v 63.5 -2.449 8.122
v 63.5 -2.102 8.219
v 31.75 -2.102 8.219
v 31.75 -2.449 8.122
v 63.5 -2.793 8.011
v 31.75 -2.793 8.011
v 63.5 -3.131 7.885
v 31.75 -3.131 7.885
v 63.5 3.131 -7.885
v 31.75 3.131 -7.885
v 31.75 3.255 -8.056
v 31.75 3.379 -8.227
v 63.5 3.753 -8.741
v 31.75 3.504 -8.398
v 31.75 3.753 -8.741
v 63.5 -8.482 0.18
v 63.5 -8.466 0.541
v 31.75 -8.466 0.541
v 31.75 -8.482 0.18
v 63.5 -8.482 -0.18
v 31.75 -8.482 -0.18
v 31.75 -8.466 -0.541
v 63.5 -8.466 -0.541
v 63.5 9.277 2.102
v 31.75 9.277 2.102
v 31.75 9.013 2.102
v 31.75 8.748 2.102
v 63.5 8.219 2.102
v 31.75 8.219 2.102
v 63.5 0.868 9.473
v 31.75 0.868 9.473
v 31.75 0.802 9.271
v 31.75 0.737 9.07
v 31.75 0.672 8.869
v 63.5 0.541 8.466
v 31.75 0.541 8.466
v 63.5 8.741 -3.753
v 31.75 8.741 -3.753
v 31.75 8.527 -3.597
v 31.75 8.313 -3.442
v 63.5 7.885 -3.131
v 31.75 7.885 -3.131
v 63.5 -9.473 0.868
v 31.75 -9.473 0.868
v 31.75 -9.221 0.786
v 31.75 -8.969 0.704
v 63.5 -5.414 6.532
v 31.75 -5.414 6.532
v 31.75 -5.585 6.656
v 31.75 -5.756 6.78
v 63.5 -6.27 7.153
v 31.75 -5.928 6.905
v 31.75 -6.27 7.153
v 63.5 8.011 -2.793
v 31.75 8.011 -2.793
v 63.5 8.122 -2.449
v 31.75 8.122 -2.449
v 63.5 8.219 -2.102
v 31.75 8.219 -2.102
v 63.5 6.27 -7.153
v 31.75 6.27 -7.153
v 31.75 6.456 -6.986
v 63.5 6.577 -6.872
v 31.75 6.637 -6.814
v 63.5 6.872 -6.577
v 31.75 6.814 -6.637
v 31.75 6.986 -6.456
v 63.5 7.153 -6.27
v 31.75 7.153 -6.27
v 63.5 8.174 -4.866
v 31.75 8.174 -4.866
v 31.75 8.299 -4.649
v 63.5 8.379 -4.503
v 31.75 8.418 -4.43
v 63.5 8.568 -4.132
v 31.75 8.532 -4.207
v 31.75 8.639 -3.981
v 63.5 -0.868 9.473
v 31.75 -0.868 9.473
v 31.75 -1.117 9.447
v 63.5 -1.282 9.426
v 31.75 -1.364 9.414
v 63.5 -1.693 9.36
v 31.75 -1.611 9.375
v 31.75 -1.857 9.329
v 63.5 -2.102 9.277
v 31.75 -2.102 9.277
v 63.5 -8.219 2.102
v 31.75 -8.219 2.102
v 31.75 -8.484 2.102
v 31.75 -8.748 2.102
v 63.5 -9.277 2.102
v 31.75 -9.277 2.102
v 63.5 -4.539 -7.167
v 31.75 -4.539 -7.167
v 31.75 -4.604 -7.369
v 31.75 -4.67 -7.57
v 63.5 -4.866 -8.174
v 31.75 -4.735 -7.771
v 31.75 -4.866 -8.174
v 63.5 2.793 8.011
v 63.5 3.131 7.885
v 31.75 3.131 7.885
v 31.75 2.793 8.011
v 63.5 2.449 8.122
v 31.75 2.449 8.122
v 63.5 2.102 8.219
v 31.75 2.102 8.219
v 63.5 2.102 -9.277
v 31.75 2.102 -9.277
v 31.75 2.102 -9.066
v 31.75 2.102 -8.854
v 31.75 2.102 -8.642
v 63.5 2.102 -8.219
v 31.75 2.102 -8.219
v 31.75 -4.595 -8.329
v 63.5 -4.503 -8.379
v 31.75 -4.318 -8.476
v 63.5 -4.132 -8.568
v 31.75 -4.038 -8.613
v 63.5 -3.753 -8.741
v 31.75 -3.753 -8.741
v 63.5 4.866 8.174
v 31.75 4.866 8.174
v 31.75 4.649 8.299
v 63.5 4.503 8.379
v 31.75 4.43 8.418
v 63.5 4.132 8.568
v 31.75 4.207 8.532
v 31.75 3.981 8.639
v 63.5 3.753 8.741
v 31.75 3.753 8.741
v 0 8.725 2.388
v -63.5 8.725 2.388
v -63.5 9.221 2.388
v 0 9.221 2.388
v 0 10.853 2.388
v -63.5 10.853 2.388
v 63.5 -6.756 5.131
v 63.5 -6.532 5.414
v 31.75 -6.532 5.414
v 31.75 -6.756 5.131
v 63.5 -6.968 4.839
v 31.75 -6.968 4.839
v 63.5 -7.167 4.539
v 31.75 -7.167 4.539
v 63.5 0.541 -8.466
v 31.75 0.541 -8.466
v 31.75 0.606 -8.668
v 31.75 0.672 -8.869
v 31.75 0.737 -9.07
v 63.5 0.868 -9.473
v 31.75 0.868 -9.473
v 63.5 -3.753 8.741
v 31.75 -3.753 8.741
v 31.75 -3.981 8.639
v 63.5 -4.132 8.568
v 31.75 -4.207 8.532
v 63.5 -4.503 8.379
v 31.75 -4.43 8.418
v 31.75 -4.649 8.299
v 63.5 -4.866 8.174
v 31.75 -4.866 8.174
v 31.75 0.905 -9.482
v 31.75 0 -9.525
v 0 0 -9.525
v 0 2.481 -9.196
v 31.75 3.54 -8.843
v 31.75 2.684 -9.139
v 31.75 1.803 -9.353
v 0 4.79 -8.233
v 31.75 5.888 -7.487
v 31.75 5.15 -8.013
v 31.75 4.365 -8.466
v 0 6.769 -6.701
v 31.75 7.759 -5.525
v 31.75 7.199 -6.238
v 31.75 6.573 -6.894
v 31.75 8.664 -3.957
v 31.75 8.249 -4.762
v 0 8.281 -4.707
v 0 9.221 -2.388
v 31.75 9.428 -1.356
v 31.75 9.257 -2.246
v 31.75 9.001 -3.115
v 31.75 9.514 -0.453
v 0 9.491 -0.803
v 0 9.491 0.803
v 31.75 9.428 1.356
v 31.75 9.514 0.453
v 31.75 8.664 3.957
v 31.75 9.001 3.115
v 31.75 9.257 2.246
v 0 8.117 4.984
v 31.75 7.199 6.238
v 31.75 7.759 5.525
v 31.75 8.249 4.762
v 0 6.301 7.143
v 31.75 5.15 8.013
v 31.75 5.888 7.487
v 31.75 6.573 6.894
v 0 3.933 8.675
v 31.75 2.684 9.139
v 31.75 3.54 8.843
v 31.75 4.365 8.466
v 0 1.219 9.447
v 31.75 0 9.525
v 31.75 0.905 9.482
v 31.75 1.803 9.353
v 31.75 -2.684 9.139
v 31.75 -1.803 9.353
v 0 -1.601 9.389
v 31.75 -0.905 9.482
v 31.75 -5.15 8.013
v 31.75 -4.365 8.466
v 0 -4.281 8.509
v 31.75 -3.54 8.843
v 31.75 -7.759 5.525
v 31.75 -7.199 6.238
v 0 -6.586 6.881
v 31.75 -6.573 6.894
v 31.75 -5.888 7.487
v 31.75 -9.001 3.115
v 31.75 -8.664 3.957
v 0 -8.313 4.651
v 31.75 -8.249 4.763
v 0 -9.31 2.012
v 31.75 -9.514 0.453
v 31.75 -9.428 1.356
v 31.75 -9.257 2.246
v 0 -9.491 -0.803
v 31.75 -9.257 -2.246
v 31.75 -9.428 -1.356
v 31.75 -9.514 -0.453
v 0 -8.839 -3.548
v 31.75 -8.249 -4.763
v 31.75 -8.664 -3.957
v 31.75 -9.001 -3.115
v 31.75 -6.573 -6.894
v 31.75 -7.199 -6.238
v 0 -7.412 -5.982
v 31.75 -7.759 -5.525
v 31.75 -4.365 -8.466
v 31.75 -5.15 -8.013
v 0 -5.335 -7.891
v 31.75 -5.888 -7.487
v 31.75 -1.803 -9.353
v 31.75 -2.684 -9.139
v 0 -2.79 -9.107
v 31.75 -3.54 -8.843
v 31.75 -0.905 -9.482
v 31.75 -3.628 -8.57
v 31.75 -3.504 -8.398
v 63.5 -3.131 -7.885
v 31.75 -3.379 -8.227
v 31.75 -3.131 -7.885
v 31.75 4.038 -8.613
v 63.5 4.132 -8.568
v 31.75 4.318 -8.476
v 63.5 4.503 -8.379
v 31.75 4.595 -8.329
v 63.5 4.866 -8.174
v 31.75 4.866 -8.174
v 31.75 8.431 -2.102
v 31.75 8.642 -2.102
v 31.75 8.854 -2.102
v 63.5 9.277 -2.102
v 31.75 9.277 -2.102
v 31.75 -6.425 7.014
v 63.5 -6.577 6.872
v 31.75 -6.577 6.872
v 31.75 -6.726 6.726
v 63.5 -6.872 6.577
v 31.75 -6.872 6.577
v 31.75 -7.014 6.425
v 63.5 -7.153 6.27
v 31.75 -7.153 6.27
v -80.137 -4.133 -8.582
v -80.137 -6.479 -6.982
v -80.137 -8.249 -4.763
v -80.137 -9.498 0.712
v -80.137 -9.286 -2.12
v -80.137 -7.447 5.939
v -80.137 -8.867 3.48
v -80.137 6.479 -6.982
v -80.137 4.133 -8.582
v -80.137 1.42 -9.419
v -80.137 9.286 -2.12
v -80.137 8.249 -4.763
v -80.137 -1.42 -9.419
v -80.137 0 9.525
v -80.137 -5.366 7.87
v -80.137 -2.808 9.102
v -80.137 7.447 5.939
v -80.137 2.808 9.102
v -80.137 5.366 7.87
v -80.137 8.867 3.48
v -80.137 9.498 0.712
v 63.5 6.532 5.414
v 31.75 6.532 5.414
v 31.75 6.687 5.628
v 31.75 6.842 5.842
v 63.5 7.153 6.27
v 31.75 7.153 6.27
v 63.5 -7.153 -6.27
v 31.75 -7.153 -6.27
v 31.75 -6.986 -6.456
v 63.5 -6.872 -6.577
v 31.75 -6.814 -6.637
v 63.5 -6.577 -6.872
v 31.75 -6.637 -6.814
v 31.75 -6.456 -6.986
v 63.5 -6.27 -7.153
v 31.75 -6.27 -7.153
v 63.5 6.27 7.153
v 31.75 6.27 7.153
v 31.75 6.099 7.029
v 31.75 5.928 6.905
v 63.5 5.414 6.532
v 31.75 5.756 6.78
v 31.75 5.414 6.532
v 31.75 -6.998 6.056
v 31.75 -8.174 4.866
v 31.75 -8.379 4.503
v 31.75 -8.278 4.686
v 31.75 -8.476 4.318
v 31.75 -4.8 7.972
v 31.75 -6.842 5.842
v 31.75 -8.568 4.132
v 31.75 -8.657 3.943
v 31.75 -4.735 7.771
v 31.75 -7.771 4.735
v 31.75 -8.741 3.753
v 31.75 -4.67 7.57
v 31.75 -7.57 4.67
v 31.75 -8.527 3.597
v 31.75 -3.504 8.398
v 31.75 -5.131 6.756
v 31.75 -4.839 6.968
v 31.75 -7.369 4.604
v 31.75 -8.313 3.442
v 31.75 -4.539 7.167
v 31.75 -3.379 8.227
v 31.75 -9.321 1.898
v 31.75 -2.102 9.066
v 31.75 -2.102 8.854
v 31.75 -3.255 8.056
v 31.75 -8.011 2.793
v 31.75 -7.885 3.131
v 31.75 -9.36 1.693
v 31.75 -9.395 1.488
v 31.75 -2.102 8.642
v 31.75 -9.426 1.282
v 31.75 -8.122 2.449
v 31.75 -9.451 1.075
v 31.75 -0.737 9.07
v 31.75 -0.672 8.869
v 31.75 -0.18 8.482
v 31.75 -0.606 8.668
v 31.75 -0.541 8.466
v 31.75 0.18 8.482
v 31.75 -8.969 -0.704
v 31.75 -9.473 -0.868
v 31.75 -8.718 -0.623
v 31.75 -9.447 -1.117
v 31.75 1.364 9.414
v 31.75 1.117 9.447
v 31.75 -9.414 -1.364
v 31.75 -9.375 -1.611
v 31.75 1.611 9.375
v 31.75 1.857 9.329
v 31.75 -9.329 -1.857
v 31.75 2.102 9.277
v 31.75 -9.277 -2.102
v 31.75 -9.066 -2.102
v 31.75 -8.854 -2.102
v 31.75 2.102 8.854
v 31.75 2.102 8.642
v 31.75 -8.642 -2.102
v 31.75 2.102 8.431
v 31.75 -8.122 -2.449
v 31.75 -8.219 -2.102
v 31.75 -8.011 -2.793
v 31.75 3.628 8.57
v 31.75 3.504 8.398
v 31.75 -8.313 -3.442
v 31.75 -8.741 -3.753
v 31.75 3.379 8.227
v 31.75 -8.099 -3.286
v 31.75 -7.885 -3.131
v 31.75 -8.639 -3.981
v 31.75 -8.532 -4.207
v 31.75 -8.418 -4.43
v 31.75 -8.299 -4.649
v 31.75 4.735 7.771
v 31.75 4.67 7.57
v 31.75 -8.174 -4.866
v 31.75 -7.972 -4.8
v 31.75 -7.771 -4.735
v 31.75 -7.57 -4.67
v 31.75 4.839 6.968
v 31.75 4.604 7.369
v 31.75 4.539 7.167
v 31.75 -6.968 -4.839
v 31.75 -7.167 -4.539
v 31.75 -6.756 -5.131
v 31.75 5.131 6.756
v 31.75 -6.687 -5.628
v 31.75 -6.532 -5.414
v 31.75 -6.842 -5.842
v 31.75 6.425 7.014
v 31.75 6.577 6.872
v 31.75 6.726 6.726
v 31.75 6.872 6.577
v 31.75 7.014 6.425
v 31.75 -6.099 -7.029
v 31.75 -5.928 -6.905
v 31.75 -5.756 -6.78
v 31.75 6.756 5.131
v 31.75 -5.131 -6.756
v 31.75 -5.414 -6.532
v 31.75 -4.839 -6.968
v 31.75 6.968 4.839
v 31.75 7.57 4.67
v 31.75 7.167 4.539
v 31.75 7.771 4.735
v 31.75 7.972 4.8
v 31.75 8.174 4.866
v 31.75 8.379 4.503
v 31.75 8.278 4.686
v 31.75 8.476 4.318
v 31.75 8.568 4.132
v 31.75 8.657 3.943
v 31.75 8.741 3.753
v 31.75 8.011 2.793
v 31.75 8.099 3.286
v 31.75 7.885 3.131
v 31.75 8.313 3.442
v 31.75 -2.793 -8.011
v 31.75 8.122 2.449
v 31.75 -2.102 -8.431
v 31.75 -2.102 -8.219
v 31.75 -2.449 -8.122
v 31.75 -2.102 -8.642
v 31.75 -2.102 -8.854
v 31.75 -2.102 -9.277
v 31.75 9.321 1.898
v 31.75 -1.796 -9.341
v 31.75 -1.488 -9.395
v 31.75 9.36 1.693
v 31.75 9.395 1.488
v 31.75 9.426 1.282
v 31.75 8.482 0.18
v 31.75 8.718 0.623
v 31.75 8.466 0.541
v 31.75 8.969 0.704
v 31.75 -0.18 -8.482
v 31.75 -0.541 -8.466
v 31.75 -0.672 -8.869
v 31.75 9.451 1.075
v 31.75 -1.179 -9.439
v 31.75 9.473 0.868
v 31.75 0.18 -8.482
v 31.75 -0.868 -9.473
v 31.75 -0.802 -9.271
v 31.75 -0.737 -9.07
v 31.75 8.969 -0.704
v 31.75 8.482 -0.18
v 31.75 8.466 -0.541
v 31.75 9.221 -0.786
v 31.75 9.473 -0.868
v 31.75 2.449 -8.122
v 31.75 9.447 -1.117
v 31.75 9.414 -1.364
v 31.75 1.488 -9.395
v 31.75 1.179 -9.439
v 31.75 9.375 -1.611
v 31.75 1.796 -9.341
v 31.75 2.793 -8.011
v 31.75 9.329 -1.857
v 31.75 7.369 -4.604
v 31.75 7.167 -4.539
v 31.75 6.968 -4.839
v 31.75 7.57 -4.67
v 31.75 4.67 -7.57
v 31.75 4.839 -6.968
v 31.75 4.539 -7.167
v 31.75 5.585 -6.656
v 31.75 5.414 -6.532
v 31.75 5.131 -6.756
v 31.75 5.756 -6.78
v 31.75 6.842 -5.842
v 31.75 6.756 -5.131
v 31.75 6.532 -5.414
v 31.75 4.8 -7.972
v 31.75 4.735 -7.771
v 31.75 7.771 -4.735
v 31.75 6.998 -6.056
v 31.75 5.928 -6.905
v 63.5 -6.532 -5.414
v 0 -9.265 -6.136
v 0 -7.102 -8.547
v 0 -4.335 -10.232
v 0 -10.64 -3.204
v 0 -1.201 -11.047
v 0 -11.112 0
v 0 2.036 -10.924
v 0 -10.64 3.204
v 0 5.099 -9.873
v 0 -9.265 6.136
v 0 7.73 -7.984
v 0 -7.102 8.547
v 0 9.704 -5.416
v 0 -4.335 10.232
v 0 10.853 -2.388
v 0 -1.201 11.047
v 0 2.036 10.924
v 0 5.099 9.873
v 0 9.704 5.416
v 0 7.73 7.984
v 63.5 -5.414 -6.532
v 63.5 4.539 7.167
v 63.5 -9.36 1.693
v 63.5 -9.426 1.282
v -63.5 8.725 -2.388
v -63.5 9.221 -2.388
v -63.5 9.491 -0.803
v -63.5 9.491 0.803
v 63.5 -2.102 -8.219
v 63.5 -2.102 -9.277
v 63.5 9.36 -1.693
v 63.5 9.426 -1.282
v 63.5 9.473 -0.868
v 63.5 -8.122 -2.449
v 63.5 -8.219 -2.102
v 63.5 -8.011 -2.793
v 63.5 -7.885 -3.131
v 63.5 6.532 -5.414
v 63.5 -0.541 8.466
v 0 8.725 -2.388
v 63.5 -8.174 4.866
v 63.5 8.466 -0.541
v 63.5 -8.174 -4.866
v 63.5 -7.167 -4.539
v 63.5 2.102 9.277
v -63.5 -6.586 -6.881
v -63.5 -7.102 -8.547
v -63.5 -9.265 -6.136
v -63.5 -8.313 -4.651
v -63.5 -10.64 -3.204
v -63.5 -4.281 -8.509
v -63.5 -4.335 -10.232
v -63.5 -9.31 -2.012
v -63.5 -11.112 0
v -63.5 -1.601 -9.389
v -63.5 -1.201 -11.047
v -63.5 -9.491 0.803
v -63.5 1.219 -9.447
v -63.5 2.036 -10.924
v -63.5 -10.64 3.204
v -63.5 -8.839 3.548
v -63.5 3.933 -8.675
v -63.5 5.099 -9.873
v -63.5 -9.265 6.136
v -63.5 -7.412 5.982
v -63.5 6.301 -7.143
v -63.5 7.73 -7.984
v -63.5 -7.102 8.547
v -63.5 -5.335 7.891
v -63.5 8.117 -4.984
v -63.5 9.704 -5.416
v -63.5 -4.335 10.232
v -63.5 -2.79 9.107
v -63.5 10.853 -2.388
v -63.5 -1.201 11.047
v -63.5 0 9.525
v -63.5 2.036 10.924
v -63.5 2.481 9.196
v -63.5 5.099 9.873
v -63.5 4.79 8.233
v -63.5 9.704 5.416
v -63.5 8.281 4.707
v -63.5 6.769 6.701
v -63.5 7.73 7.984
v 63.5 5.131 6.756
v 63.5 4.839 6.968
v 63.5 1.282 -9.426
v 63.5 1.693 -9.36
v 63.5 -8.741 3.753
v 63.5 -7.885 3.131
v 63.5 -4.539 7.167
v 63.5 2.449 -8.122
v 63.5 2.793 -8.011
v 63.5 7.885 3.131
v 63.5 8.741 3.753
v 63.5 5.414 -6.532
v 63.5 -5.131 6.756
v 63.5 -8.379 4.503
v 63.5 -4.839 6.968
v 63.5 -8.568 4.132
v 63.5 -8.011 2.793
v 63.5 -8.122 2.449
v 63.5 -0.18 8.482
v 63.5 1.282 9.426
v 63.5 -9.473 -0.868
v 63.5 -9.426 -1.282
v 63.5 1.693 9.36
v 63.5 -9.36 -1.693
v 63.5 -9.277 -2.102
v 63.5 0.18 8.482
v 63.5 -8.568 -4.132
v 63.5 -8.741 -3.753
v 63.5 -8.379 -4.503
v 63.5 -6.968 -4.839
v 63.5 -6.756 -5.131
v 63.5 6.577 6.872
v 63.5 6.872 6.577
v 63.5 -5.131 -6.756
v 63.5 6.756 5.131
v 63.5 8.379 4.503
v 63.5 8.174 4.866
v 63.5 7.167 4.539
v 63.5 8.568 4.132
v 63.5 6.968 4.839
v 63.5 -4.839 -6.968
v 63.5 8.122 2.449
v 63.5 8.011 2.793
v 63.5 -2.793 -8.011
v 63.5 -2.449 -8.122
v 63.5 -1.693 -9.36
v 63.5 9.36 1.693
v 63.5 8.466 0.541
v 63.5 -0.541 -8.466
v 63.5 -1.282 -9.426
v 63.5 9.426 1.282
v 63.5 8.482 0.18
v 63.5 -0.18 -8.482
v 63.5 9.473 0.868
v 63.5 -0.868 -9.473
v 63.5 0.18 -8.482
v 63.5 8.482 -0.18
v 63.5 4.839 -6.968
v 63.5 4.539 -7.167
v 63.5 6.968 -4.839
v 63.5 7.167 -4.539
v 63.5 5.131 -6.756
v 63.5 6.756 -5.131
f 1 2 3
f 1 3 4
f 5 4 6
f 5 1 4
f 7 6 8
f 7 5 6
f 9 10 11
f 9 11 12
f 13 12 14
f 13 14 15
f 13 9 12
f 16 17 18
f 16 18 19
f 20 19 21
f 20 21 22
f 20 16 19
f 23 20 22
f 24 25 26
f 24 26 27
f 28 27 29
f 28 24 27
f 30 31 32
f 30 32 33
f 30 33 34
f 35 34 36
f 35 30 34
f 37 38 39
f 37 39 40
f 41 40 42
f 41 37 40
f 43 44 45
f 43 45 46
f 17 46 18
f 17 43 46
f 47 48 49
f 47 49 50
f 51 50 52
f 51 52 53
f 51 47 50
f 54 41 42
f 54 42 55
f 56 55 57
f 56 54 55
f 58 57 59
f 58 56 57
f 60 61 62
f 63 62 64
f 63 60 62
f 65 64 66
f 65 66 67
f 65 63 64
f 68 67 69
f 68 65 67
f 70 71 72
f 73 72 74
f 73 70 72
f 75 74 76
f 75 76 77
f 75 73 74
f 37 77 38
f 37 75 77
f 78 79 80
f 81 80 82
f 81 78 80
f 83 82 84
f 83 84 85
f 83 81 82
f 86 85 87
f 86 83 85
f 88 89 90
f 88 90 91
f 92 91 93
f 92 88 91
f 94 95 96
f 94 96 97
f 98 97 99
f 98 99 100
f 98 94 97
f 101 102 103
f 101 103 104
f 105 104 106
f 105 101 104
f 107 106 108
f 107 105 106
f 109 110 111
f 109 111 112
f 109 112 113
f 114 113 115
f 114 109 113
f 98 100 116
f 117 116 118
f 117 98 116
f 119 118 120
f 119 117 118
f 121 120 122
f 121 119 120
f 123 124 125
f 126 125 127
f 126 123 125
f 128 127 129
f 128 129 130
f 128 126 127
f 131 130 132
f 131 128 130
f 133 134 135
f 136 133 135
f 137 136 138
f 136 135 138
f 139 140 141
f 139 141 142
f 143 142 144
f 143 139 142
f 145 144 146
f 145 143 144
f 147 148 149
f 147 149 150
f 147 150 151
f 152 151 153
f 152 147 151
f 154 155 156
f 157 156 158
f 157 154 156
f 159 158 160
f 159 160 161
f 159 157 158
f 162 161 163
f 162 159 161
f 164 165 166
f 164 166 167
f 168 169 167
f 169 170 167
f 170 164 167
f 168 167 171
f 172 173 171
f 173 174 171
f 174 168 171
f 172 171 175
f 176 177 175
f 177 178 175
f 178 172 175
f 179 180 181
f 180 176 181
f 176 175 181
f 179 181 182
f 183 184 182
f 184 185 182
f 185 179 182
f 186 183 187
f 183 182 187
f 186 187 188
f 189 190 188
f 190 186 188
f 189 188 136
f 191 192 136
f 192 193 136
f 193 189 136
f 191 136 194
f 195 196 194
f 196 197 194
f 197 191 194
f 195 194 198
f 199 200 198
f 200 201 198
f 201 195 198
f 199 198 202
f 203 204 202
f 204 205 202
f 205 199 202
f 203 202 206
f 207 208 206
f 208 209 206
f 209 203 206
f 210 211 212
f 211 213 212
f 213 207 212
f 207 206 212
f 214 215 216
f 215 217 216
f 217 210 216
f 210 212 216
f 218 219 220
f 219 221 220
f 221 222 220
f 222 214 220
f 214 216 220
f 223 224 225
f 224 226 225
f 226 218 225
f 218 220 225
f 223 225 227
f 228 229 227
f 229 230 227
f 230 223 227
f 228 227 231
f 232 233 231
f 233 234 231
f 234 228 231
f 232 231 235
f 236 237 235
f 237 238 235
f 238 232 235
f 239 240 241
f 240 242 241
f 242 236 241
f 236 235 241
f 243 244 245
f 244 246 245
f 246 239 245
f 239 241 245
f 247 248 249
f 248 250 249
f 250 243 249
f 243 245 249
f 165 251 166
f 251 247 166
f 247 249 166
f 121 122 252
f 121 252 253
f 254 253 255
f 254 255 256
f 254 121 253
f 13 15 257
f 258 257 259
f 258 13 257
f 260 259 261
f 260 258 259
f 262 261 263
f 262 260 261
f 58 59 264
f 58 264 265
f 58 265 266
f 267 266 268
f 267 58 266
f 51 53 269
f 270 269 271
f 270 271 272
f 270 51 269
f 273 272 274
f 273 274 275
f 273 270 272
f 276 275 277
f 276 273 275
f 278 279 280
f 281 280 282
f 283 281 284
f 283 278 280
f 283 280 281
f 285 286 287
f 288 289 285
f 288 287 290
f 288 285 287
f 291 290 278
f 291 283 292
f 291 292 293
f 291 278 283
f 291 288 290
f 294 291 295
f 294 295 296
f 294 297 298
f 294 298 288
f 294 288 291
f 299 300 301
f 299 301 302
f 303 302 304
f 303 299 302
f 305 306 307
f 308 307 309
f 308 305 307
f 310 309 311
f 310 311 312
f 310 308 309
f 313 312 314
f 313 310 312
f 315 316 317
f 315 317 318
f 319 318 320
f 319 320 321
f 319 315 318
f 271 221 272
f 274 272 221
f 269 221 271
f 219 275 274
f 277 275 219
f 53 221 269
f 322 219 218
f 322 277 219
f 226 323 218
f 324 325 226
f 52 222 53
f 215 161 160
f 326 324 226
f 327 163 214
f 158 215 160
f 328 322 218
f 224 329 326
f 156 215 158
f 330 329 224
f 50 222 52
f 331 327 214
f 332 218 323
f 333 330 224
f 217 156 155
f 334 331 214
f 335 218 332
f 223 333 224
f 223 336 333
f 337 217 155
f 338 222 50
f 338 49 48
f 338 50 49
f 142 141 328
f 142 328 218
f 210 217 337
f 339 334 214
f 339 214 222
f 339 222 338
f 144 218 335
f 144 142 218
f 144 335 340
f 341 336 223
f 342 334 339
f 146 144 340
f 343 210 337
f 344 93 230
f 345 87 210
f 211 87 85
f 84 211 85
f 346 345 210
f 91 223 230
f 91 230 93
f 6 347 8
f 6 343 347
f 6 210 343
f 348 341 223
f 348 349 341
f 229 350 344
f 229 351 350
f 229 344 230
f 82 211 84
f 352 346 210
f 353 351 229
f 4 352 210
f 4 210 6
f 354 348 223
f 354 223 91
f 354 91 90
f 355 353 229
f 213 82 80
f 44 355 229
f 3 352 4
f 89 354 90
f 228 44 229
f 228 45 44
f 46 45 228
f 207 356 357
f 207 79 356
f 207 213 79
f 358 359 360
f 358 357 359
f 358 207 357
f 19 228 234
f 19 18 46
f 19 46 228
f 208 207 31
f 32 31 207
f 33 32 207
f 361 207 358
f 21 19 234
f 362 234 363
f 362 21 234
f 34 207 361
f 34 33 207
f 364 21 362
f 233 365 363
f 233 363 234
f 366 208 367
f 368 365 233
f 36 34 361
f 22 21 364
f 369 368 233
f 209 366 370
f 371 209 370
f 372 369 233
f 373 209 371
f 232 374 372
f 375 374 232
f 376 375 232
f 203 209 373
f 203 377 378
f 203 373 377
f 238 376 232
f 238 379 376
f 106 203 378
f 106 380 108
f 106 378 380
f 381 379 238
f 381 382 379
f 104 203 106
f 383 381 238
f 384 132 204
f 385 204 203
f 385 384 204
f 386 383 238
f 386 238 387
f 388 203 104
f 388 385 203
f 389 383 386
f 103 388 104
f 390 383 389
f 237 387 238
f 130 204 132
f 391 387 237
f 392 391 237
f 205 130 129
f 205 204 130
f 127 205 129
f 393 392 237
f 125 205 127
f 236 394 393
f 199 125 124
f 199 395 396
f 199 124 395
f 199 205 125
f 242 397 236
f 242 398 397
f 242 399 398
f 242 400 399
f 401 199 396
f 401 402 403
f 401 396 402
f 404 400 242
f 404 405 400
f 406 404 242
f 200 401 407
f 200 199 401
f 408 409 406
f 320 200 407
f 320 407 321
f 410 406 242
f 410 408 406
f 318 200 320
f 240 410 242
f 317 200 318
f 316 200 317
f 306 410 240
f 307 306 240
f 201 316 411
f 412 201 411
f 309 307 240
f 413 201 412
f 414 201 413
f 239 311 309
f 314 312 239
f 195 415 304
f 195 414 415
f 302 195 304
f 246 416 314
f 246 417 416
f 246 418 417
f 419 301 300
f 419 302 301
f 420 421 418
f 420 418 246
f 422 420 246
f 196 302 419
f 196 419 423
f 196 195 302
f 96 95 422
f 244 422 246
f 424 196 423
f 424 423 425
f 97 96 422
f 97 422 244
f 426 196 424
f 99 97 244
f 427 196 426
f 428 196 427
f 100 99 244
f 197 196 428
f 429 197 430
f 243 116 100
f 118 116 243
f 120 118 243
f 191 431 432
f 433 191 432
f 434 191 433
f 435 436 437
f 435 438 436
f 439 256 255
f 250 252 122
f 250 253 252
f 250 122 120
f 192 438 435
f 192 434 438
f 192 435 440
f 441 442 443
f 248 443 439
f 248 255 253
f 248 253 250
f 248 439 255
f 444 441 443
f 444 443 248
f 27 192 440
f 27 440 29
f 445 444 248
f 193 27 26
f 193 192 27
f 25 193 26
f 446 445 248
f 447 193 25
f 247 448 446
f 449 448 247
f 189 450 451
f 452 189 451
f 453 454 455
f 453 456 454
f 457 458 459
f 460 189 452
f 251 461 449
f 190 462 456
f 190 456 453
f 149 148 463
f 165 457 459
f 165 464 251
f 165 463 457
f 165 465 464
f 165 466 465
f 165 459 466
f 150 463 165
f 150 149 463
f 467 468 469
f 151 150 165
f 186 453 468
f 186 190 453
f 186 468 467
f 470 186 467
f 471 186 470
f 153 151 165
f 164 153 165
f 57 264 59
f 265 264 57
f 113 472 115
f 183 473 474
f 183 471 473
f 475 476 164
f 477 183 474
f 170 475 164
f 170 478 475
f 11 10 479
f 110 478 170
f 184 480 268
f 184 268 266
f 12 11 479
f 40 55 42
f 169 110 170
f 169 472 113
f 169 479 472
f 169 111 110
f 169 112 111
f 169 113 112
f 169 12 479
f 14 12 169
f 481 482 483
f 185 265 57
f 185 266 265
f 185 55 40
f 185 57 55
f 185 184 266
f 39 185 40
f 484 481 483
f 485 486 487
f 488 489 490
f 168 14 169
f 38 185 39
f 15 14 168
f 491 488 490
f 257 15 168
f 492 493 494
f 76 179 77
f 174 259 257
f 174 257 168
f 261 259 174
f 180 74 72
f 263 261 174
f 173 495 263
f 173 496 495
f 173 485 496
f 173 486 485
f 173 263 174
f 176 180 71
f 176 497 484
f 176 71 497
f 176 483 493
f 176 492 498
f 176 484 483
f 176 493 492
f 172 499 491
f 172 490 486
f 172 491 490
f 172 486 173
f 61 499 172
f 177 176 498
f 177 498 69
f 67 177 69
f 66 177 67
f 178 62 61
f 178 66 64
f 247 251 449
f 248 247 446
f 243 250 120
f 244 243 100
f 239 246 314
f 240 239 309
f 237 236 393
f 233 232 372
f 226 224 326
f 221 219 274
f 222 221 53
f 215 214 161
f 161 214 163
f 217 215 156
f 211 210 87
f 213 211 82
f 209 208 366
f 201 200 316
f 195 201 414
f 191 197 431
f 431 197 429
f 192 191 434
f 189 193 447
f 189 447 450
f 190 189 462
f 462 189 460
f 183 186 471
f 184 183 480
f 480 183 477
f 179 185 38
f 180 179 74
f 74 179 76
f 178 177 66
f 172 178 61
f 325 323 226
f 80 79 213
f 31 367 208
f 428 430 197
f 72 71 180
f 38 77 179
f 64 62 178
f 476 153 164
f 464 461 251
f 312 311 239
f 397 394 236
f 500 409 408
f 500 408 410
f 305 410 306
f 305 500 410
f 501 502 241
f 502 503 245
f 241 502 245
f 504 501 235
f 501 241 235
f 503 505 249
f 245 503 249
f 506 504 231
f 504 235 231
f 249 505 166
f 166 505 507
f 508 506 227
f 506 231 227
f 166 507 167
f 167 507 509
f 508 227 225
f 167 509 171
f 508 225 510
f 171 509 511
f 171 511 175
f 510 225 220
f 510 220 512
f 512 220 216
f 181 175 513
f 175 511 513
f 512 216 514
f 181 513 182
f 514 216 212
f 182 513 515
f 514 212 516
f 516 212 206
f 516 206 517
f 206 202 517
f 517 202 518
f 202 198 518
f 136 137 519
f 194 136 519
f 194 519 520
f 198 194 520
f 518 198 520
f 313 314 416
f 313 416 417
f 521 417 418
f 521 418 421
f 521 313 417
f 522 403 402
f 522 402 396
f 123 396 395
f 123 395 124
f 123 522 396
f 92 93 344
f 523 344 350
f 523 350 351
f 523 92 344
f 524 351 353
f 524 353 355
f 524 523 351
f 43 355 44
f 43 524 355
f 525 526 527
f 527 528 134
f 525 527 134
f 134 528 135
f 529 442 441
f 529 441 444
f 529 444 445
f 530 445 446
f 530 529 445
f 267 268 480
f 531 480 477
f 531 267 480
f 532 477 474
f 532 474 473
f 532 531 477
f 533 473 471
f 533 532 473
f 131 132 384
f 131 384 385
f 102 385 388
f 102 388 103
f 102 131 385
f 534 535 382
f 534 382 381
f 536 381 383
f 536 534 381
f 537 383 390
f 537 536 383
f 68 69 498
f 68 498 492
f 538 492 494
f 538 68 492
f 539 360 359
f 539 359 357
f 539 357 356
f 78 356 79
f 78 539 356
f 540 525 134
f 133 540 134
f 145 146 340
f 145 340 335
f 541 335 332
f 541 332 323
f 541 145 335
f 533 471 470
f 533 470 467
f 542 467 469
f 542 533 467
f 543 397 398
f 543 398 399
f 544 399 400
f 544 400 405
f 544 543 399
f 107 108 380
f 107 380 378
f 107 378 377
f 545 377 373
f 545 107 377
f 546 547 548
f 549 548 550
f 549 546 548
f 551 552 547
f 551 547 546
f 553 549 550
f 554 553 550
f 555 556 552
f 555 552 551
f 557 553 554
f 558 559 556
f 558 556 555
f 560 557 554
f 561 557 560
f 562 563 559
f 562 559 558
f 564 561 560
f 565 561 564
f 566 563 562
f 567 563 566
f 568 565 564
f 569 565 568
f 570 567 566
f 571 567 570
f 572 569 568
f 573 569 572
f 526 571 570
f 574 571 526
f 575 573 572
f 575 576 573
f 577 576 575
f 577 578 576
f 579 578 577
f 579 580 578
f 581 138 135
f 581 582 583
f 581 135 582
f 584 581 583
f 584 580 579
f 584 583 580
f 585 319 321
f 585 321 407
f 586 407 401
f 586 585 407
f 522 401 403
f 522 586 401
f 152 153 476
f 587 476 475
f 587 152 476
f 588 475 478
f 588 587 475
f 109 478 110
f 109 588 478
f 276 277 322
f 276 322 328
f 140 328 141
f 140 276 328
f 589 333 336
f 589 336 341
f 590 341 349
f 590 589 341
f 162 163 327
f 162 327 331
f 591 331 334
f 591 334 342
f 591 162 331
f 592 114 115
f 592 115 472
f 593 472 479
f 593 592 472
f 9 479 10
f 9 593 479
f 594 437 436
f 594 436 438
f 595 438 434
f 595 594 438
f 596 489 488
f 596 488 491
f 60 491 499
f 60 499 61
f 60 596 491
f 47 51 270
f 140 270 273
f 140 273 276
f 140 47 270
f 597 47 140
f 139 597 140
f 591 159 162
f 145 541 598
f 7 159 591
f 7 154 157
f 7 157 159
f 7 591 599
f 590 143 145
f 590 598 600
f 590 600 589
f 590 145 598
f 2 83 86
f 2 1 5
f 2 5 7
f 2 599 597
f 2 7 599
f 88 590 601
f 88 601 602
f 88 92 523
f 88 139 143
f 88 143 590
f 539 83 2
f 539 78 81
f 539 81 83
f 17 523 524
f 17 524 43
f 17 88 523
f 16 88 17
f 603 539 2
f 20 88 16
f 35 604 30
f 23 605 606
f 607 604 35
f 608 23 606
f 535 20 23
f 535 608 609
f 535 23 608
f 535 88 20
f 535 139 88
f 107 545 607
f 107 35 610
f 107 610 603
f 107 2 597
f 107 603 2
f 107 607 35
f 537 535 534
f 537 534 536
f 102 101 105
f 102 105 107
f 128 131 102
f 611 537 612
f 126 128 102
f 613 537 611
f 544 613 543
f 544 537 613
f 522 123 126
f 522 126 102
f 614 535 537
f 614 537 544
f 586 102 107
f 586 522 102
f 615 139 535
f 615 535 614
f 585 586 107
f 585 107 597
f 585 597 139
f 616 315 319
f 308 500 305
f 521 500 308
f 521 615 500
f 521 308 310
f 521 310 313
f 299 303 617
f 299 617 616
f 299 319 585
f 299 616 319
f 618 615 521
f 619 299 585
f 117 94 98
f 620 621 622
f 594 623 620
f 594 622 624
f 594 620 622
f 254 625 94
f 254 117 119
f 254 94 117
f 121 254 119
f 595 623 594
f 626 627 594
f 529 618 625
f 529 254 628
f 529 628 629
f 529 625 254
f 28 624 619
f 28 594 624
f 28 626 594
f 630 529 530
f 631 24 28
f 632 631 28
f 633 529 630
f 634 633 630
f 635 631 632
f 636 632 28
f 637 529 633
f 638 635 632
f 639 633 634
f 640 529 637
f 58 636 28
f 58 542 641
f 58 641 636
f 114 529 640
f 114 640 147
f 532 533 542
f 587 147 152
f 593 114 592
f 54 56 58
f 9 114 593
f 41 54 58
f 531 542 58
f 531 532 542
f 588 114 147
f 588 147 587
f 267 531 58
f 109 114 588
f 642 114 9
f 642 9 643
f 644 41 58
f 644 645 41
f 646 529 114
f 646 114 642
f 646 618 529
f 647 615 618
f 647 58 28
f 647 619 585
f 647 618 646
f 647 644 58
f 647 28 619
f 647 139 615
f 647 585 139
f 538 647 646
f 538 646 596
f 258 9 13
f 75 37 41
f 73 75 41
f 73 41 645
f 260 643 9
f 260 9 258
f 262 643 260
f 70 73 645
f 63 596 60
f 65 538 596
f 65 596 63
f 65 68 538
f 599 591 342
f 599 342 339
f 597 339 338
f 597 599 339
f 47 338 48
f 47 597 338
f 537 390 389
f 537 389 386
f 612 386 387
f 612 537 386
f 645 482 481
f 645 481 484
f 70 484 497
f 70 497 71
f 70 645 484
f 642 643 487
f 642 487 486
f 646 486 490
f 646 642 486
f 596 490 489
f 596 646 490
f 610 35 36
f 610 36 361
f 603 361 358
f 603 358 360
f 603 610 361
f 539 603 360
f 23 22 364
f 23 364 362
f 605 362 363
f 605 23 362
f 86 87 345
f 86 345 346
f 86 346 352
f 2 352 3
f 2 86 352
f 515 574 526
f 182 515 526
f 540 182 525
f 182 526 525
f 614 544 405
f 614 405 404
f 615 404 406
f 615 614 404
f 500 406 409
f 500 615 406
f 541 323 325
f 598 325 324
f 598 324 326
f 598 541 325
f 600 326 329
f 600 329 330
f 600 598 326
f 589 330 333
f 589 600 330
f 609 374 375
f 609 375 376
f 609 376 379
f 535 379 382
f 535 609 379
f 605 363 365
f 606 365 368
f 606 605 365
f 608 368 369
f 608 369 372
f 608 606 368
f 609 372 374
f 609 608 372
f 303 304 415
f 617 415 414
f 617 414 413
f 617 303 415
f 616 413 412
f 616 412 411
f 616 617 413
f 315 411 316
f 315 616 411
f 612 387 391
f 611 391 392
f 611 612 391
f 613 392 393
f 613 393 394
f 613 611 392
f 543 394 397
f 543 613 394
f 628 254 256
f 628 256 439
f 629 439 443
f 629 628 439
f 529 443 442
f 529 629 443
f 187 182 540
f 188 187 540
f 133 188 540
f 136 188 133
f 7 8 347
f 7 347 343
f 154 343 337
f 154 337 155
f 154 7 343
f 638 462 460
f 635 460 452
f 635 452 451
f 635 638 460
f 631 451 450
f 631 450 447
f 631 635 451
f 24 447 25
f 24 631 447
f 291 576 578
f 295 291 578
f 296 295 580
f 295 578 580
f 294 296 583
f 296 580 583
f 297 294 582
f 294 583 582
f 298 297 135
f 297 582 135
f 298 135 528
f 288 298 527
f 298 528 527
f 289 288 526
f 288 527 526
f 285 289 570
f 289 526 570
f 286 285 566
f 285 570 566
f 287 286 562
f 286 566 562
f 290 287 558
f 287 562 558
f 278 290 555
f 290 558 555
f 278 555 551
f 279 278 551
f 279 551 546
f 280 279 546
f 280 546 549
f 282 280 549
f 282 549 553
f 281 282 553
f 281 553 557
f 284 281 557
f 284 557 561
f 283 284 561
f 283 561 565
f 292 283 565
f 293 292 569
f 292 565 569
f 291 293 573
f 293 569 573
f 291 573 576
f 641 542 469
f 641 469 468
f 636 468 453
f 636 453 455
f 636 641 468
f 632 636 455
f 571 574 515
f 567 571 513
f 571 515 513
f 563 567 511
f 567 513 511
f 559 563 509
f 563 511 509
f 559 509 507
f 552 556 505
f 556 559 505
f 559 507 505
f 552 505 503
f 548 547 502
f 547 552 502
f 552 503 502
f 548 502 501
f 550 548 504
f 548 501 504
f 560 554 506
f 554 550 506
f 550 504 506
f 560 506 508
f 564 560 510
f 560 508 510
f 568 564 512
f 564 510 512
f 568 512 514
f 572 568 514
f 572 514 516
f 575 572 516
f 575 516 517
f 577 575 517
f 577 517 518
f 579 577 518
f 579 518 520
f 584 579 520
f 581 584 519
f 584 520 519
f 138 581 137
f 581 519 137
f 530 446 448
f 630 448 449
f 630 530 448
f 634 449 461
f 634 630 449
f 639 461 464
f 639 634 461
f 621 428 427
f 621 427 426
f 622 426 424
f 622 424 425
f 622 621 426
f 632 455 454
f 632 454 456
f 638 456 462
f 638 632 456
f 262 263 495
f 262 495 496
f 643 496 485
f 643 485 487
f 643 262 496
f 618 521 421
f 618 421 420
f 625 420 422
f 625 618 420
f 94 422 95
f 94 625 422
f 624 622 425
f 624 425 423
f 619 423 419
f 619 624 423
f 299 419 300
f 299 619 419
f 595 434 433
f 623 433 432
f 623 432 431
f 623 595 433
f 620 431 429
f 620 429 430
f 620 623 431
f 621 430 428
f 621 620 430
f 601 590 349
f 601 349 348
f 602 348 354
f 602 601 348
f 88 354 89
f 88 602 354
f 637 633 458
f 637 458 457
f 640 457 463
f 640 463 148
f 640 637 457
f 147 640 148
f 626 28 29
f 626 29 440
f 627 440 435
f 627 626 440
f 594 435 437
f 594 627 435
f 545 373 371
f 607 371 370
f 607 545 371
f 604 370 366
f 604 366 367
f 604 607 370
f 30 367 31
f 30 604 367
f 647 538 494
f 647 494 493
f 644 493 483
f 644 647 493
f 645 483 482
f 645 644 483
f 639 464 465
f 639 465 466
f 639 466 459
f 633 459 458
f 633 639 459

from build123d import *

# Parameters (mm, degrees)
SKETCH1_R           = 9.525
BOSS_EXTRUDE1_DEPTH = 63.5
SKETCH2_OUTSIDE_W   = 34.846
SKETCH2_OUTSIDE_H   = 34.846
CUT_EXTRUDE1_DEPTH  = 31.75
SKETCH3_R           = 11.1125
BOSS_EXTRUDE2_DEPTH = 63.5
SKETCH4_R           = 9.525
BOSS_EXTRUDE3_DEPTH = 16.637
CUT_EXTRUDE2_DEPTH  = 63.5


with BuildPart() as part:
    # Sketch1 → Boss-Extrude1 (new body)
    with BuildSketch(Plane(origin=(0, 0, 0), x_dir=(0, 0, -1), z_dir=(1, 0, 0))):
        Circle(SKETCH1_R)
    extrude(amount=BOSS_EXTRUDE1_DEPTH)

    # Sketch2 outside → Cut-Extrude1 (cut)
    with BuildSketch(Plane(origin=(63.5, 0, 0), x_dir=(0, 0, -1), z_dir=(1, 0, 0))):
        Rectangle(SKETCH2_OUTSIDE_W, SKETCH2_OUTSIDE_H)
        with BuildLine():
            Line((-2.10185, -8.219105519), (-2.10185, -9.277180491))
            ThreePointArc((-2.10185, -9.277180491), (-1.488051562, -9.395187802), (-0.867828293, -9.472630329))
            Line((-0.867828293, -9.472630329), (-0.540865145, -8.466341232))
            ThreePointArc((-0.540865145, -8.466341232), (0, -8.4836), (0.540865145, -8.466341232))
            Line((0.540865145, -8.466341232), (0.867828293, -9.472630329))
            ThreePointArc((0.867828293, -9.472630329), (1.488051562, -9.395187802), (2.10185, -9.277180491))
            Line((2.10185, -9.277180491), (2.10185, -8.219105519))
            ThreePointArc((2.10185, -8.219105519), (2.621576573, -8.068383062), (3.130636642, -7.884832476))
            Line((3.130636642, -7.884832476), (3.752557506, -8.74083311))
            ThreePointArc((3.752557506, -8.74083311), (4.318493831, -8.47552136), (4.86578457, -8.173615589))
            Line((4.86578457, -8.173615589), (4.538821423, -7.167326493))
            ThreePointArc((4.538821423, -7.167326493), (4.986534966, -6.863376573), (5.413959611, -6.531501381))
            Line((5.413959611, -6.531501381), (6.269960245, -7.153422245))
            ThreePointArc((6.269960245, -7.153422245), (6.726211835, -6.726211835), (7.153422245, -6.269960245))
            Line((7.153422245, -6.269960245), (6.531501381, -5.413959611))
            ThreePointArc((6.531501381, -5.413959611), (6.863376573, -4.986534966), (7.167326493, -4.538821423))
            Line((7.167326493, -4.538821423), (8.173615589, -4.86578457))
            ThreePointArc((8.173615589, -4.86578457), (8.47552136, -4.318493831), (8.74083311, -3.752557506))
            Line((8.74083311, -3.752557506), (7.884832476, -3.130636642))
            ThreePointArc((7.884832476, -3.130636642), (8.068383062, -2.621576573), (8.219105519, -2.10185))
            Line((8.219105519, -2.10185), (9.277180491, -2.10185))
            ThreePointArc((9.277180491, -2.10185), (9.395187802, -1.488051562), (9.472630329, -0.867828293))
            Line((9.472630329, -0.867828293), (8.466341232, -0.540865145))
            ThreePointArc((8.466341232, -0.540865145), (8.4836, 0), (8.466341232, 0.540865145))
            Line((8.466341232, 0.540865145), (9.472630329, 0.867828293))
            ThreePointArc((9.472630329, 0.867828293), (9.395187802, 1.488051562), (9.277180491, 2.10185))
            Line((9.277180491, 2.10185), (8.219105519, 2.10185))
            ThreePointArc((8.219105519, 2.10185), (8.068383062, 2.621576573), (7.884832476, 3.130636642))
            Line((7.884832476, 3.130636642), (8.74083311, 3.752557506))
            ThreePointArc((8.74083311, 3.752557506), (8.47552136, 4.318493831), (8.173615589, 4.86578457))
            Line((8.173615589, 4.86578457), (7.167326493, 4.538821423))
            ThreePointArc((7.167326493, 4.538821423), (6.863376573, 4.986534966), (6.531501381, 5.413959611))
            Line((6.531501381, 5.413959611), (7.153422245, 6.269960245))
            ThreePointArc((7.153422245, 6.269960245), (6.726211835, 6.726211835), (6.269960245, 7.153422245))
            Line((6.269960245, 7.153422245), (5.413959611, 6.531501381))
            ThreePointArc((5.413959611, 6.531501381), (4.986534966, 6.863376573), (4.538821423, 7.167326493))
            Line((4.538821423, 7.167326493), (4.86578457, 8.173615589))
            ThreePointArc((4.86578457, 8.173615589), (4.318493831, 8.47552136), (3.752557506, 8.74083311))
            Line((3.752557506, 8.74083311), (3.130636642, 7.884832476))
            ThreePointArc((3.130636642, 7.884832476), (2.621576573, 8.068383062), (2.10185, 8.219105519))
            Line((2.10185, 8.219105519), (2.10185, 9.277180491))
            ThreePointArc((2.10185, 9.277180491), (1.488051562, 9.395187802), (0.867828293, 9.472630329))
            Line((0.867828293, 9.472630329), (0.540865145, 8.466341232))
            ThreePointArc((0.540865145, 8.466341232), (0, 8.4836), (-0.540865145, 8.466341232))
            Line((-0.540865145, 8.466341232), (-0.867828293, 9.472630329))
            ThreePointArc((-0.867828293, 9.472630329), (-1.488051562, 9.395187802), (-2.10185, 9.277180491))
            Line((-2.10185, 9.277180491), (-2.10185, 8.219105519))
            ThreePointArc((-2.10185, 8.219105519), (-2.621576573, 8.068383062), (-3.130636642, 7.884832476))
            Line((-3.130636642, 7.884832476), (-3.752557506, 8.74083311))
            ThreePointArc((-3.752557506, 8.74083311), (-4.318493831, 8.47552136), (-4.86578457, 8.173615589))
            Line((-4.86578457, 8.173615589), (-4.538821423, 7.167326493))
            ThreePointArc((-4.538821423, 7.167326493), (-4.986534966, 6.863376573), (-5.413959611, 6.531501381))
            Line((-5.413959611, 6.531501381), (-6.269960245, 7.153422245))
            ThreePointArc((-6.269960245, 7.153422245), (-6.726211835, 6.726211835), (-7.153422245, 6.269960245))
            Line((-7.153422245, 6.269960245), (-6.531501381, 5.413959611))
            ThreePointArc((-6.531501381, 5.413959611), (-6.863376573, 4.986534966), (-7.167326493, 4.538821423))
            Line((-7.167326493, 4.538821423), (-8.173615589, 4.86578457))
            ThreePointArc((-8.173615589, 4.86578457), (-8.47552136, 4.318493831), (-8.74083311, 3.752557506))
            Line((-8.74083311, 3.752557506), (-7.884832476, 3.130636642))
            ThreePointArc((-7.884832476, 3.130636642), (-8.068383062, 2.621576573), (-8.219105519, 2.10185))
            Line((-8.219105519, 2.10185), (-9.277180491, 2.10185))
            ThreePointArc((-9.277180491, 2.10185), (-9.395187802, 1.488051562), (-9.472630329, 0.867828293))
            Line((-9.472630329, 0.867828293), (-8.466341232, 0.540865145))
            ThreePointArc((-8.466341232, 0.540865145), (-8.4836, 0), (-8.466341232, -0.540865145))
            Line((-8.466341232, -0.540865145), (-9.472630329, -0.867828293))
            ThreePointArc((-9.472630329, -0.867828293), (-9.395187802, -1.488051562), (-9.277180491, -2.10185))
            Line((-9.277180491, -2.10185), (-8.219105519, -2.10185))
            ThreePointArc((-8.219105519, -2.10185), (-8.068383062, -2.621576573), (-7.884832476, -3.130636642))
            Line((-7.884832476, -3.130636642), (-8.74083311, -3.752557506))
            ThreePointArc((-8.74083311, -3.752557506), (-8.47552136, -4.318493831), (-8.173615589, -4.86578457))
            Line((-8.173615589, -4.86578457), (-7.167326493, -4.538821423))
            ThreePointArc((-7.167326493, -4.538821423), (-6.863376573, -4.986534966), (-6.531501381, -5.413959611))
            Line((-6.531501381, -5.413959611), (-7.153422245, -6.269960245))
            ThreePointArc((-7.153422245, -6.269960245), (-6.726211835, -6.726211835), (-6.269960245, -7.153422245))
            Line((-6.269960245, -7.153422245), (-5.413959611, -6.531501381))
            ThreePointArc((-5.413959611, -6.531501381), (-4.986534966, -6.863376573), (-4.538821423, -7.167326493))
            Line((-4.538821423, -7.167326493), (-4.86578457, -8.173615589))
            ThreePointArc((-4.86578457, -8.173615589), (-4.318493831, -8.47552136), (-3.752557506, -8.74083311))
            Line((-3.752557506, -8.74083311), (-3.130636642, -7.884832476))
            ThreePointArc((-3.130636642, -7.884832476), (-2.621576573, -8.068383062), (-2.10185, -8.219105519))
        make_face(mode=Mode.SUBTRACT)
    extrude(amount=-CUT_EXTRUDE1_DEPTH, mode=Mode.SUBTRACT)

    # Sketch3 → Boss-Extrude2 (add)
    with BuildSketch(Plane.ZY):
        Circle(SKETCH3_R)
    extrude(amount=BOSS_EXTRUDE2_DEPTH)

    # Sketch4 → Boss-Extrude3 (add)
    with BuildSketch(Plane.ZY.offset(63.5)):
        Circle(SKETCH4_R)
    extrude(amount=BOSS_EXTRUDE3_DEPTH)

    # Sketch5 → Cut-Extrude2 (cut)
    with BuildSketch(Plane.ZY.offset(63.5)):
        with BuildLine():
            Line((0, 8.7249), (2.3876, 8.7249))
            Line((2.3876, 8.7249), (2.3876, 10.852972979))
            ThreePointArc((2.3876, 10.852972979), (0, 11.1125), (-2.3876, 10.852972979))
            Line((-2.3876, 10.852972979), (-2.3876, 8.7249))
            Line((-2.3876, 8.7249), (0, 8.7249))
        make_face()
    extrude(amount=-CUT_EXTRUDE2_DEPTH, mode=Mode.SUBTRACT)


solid = part.part
